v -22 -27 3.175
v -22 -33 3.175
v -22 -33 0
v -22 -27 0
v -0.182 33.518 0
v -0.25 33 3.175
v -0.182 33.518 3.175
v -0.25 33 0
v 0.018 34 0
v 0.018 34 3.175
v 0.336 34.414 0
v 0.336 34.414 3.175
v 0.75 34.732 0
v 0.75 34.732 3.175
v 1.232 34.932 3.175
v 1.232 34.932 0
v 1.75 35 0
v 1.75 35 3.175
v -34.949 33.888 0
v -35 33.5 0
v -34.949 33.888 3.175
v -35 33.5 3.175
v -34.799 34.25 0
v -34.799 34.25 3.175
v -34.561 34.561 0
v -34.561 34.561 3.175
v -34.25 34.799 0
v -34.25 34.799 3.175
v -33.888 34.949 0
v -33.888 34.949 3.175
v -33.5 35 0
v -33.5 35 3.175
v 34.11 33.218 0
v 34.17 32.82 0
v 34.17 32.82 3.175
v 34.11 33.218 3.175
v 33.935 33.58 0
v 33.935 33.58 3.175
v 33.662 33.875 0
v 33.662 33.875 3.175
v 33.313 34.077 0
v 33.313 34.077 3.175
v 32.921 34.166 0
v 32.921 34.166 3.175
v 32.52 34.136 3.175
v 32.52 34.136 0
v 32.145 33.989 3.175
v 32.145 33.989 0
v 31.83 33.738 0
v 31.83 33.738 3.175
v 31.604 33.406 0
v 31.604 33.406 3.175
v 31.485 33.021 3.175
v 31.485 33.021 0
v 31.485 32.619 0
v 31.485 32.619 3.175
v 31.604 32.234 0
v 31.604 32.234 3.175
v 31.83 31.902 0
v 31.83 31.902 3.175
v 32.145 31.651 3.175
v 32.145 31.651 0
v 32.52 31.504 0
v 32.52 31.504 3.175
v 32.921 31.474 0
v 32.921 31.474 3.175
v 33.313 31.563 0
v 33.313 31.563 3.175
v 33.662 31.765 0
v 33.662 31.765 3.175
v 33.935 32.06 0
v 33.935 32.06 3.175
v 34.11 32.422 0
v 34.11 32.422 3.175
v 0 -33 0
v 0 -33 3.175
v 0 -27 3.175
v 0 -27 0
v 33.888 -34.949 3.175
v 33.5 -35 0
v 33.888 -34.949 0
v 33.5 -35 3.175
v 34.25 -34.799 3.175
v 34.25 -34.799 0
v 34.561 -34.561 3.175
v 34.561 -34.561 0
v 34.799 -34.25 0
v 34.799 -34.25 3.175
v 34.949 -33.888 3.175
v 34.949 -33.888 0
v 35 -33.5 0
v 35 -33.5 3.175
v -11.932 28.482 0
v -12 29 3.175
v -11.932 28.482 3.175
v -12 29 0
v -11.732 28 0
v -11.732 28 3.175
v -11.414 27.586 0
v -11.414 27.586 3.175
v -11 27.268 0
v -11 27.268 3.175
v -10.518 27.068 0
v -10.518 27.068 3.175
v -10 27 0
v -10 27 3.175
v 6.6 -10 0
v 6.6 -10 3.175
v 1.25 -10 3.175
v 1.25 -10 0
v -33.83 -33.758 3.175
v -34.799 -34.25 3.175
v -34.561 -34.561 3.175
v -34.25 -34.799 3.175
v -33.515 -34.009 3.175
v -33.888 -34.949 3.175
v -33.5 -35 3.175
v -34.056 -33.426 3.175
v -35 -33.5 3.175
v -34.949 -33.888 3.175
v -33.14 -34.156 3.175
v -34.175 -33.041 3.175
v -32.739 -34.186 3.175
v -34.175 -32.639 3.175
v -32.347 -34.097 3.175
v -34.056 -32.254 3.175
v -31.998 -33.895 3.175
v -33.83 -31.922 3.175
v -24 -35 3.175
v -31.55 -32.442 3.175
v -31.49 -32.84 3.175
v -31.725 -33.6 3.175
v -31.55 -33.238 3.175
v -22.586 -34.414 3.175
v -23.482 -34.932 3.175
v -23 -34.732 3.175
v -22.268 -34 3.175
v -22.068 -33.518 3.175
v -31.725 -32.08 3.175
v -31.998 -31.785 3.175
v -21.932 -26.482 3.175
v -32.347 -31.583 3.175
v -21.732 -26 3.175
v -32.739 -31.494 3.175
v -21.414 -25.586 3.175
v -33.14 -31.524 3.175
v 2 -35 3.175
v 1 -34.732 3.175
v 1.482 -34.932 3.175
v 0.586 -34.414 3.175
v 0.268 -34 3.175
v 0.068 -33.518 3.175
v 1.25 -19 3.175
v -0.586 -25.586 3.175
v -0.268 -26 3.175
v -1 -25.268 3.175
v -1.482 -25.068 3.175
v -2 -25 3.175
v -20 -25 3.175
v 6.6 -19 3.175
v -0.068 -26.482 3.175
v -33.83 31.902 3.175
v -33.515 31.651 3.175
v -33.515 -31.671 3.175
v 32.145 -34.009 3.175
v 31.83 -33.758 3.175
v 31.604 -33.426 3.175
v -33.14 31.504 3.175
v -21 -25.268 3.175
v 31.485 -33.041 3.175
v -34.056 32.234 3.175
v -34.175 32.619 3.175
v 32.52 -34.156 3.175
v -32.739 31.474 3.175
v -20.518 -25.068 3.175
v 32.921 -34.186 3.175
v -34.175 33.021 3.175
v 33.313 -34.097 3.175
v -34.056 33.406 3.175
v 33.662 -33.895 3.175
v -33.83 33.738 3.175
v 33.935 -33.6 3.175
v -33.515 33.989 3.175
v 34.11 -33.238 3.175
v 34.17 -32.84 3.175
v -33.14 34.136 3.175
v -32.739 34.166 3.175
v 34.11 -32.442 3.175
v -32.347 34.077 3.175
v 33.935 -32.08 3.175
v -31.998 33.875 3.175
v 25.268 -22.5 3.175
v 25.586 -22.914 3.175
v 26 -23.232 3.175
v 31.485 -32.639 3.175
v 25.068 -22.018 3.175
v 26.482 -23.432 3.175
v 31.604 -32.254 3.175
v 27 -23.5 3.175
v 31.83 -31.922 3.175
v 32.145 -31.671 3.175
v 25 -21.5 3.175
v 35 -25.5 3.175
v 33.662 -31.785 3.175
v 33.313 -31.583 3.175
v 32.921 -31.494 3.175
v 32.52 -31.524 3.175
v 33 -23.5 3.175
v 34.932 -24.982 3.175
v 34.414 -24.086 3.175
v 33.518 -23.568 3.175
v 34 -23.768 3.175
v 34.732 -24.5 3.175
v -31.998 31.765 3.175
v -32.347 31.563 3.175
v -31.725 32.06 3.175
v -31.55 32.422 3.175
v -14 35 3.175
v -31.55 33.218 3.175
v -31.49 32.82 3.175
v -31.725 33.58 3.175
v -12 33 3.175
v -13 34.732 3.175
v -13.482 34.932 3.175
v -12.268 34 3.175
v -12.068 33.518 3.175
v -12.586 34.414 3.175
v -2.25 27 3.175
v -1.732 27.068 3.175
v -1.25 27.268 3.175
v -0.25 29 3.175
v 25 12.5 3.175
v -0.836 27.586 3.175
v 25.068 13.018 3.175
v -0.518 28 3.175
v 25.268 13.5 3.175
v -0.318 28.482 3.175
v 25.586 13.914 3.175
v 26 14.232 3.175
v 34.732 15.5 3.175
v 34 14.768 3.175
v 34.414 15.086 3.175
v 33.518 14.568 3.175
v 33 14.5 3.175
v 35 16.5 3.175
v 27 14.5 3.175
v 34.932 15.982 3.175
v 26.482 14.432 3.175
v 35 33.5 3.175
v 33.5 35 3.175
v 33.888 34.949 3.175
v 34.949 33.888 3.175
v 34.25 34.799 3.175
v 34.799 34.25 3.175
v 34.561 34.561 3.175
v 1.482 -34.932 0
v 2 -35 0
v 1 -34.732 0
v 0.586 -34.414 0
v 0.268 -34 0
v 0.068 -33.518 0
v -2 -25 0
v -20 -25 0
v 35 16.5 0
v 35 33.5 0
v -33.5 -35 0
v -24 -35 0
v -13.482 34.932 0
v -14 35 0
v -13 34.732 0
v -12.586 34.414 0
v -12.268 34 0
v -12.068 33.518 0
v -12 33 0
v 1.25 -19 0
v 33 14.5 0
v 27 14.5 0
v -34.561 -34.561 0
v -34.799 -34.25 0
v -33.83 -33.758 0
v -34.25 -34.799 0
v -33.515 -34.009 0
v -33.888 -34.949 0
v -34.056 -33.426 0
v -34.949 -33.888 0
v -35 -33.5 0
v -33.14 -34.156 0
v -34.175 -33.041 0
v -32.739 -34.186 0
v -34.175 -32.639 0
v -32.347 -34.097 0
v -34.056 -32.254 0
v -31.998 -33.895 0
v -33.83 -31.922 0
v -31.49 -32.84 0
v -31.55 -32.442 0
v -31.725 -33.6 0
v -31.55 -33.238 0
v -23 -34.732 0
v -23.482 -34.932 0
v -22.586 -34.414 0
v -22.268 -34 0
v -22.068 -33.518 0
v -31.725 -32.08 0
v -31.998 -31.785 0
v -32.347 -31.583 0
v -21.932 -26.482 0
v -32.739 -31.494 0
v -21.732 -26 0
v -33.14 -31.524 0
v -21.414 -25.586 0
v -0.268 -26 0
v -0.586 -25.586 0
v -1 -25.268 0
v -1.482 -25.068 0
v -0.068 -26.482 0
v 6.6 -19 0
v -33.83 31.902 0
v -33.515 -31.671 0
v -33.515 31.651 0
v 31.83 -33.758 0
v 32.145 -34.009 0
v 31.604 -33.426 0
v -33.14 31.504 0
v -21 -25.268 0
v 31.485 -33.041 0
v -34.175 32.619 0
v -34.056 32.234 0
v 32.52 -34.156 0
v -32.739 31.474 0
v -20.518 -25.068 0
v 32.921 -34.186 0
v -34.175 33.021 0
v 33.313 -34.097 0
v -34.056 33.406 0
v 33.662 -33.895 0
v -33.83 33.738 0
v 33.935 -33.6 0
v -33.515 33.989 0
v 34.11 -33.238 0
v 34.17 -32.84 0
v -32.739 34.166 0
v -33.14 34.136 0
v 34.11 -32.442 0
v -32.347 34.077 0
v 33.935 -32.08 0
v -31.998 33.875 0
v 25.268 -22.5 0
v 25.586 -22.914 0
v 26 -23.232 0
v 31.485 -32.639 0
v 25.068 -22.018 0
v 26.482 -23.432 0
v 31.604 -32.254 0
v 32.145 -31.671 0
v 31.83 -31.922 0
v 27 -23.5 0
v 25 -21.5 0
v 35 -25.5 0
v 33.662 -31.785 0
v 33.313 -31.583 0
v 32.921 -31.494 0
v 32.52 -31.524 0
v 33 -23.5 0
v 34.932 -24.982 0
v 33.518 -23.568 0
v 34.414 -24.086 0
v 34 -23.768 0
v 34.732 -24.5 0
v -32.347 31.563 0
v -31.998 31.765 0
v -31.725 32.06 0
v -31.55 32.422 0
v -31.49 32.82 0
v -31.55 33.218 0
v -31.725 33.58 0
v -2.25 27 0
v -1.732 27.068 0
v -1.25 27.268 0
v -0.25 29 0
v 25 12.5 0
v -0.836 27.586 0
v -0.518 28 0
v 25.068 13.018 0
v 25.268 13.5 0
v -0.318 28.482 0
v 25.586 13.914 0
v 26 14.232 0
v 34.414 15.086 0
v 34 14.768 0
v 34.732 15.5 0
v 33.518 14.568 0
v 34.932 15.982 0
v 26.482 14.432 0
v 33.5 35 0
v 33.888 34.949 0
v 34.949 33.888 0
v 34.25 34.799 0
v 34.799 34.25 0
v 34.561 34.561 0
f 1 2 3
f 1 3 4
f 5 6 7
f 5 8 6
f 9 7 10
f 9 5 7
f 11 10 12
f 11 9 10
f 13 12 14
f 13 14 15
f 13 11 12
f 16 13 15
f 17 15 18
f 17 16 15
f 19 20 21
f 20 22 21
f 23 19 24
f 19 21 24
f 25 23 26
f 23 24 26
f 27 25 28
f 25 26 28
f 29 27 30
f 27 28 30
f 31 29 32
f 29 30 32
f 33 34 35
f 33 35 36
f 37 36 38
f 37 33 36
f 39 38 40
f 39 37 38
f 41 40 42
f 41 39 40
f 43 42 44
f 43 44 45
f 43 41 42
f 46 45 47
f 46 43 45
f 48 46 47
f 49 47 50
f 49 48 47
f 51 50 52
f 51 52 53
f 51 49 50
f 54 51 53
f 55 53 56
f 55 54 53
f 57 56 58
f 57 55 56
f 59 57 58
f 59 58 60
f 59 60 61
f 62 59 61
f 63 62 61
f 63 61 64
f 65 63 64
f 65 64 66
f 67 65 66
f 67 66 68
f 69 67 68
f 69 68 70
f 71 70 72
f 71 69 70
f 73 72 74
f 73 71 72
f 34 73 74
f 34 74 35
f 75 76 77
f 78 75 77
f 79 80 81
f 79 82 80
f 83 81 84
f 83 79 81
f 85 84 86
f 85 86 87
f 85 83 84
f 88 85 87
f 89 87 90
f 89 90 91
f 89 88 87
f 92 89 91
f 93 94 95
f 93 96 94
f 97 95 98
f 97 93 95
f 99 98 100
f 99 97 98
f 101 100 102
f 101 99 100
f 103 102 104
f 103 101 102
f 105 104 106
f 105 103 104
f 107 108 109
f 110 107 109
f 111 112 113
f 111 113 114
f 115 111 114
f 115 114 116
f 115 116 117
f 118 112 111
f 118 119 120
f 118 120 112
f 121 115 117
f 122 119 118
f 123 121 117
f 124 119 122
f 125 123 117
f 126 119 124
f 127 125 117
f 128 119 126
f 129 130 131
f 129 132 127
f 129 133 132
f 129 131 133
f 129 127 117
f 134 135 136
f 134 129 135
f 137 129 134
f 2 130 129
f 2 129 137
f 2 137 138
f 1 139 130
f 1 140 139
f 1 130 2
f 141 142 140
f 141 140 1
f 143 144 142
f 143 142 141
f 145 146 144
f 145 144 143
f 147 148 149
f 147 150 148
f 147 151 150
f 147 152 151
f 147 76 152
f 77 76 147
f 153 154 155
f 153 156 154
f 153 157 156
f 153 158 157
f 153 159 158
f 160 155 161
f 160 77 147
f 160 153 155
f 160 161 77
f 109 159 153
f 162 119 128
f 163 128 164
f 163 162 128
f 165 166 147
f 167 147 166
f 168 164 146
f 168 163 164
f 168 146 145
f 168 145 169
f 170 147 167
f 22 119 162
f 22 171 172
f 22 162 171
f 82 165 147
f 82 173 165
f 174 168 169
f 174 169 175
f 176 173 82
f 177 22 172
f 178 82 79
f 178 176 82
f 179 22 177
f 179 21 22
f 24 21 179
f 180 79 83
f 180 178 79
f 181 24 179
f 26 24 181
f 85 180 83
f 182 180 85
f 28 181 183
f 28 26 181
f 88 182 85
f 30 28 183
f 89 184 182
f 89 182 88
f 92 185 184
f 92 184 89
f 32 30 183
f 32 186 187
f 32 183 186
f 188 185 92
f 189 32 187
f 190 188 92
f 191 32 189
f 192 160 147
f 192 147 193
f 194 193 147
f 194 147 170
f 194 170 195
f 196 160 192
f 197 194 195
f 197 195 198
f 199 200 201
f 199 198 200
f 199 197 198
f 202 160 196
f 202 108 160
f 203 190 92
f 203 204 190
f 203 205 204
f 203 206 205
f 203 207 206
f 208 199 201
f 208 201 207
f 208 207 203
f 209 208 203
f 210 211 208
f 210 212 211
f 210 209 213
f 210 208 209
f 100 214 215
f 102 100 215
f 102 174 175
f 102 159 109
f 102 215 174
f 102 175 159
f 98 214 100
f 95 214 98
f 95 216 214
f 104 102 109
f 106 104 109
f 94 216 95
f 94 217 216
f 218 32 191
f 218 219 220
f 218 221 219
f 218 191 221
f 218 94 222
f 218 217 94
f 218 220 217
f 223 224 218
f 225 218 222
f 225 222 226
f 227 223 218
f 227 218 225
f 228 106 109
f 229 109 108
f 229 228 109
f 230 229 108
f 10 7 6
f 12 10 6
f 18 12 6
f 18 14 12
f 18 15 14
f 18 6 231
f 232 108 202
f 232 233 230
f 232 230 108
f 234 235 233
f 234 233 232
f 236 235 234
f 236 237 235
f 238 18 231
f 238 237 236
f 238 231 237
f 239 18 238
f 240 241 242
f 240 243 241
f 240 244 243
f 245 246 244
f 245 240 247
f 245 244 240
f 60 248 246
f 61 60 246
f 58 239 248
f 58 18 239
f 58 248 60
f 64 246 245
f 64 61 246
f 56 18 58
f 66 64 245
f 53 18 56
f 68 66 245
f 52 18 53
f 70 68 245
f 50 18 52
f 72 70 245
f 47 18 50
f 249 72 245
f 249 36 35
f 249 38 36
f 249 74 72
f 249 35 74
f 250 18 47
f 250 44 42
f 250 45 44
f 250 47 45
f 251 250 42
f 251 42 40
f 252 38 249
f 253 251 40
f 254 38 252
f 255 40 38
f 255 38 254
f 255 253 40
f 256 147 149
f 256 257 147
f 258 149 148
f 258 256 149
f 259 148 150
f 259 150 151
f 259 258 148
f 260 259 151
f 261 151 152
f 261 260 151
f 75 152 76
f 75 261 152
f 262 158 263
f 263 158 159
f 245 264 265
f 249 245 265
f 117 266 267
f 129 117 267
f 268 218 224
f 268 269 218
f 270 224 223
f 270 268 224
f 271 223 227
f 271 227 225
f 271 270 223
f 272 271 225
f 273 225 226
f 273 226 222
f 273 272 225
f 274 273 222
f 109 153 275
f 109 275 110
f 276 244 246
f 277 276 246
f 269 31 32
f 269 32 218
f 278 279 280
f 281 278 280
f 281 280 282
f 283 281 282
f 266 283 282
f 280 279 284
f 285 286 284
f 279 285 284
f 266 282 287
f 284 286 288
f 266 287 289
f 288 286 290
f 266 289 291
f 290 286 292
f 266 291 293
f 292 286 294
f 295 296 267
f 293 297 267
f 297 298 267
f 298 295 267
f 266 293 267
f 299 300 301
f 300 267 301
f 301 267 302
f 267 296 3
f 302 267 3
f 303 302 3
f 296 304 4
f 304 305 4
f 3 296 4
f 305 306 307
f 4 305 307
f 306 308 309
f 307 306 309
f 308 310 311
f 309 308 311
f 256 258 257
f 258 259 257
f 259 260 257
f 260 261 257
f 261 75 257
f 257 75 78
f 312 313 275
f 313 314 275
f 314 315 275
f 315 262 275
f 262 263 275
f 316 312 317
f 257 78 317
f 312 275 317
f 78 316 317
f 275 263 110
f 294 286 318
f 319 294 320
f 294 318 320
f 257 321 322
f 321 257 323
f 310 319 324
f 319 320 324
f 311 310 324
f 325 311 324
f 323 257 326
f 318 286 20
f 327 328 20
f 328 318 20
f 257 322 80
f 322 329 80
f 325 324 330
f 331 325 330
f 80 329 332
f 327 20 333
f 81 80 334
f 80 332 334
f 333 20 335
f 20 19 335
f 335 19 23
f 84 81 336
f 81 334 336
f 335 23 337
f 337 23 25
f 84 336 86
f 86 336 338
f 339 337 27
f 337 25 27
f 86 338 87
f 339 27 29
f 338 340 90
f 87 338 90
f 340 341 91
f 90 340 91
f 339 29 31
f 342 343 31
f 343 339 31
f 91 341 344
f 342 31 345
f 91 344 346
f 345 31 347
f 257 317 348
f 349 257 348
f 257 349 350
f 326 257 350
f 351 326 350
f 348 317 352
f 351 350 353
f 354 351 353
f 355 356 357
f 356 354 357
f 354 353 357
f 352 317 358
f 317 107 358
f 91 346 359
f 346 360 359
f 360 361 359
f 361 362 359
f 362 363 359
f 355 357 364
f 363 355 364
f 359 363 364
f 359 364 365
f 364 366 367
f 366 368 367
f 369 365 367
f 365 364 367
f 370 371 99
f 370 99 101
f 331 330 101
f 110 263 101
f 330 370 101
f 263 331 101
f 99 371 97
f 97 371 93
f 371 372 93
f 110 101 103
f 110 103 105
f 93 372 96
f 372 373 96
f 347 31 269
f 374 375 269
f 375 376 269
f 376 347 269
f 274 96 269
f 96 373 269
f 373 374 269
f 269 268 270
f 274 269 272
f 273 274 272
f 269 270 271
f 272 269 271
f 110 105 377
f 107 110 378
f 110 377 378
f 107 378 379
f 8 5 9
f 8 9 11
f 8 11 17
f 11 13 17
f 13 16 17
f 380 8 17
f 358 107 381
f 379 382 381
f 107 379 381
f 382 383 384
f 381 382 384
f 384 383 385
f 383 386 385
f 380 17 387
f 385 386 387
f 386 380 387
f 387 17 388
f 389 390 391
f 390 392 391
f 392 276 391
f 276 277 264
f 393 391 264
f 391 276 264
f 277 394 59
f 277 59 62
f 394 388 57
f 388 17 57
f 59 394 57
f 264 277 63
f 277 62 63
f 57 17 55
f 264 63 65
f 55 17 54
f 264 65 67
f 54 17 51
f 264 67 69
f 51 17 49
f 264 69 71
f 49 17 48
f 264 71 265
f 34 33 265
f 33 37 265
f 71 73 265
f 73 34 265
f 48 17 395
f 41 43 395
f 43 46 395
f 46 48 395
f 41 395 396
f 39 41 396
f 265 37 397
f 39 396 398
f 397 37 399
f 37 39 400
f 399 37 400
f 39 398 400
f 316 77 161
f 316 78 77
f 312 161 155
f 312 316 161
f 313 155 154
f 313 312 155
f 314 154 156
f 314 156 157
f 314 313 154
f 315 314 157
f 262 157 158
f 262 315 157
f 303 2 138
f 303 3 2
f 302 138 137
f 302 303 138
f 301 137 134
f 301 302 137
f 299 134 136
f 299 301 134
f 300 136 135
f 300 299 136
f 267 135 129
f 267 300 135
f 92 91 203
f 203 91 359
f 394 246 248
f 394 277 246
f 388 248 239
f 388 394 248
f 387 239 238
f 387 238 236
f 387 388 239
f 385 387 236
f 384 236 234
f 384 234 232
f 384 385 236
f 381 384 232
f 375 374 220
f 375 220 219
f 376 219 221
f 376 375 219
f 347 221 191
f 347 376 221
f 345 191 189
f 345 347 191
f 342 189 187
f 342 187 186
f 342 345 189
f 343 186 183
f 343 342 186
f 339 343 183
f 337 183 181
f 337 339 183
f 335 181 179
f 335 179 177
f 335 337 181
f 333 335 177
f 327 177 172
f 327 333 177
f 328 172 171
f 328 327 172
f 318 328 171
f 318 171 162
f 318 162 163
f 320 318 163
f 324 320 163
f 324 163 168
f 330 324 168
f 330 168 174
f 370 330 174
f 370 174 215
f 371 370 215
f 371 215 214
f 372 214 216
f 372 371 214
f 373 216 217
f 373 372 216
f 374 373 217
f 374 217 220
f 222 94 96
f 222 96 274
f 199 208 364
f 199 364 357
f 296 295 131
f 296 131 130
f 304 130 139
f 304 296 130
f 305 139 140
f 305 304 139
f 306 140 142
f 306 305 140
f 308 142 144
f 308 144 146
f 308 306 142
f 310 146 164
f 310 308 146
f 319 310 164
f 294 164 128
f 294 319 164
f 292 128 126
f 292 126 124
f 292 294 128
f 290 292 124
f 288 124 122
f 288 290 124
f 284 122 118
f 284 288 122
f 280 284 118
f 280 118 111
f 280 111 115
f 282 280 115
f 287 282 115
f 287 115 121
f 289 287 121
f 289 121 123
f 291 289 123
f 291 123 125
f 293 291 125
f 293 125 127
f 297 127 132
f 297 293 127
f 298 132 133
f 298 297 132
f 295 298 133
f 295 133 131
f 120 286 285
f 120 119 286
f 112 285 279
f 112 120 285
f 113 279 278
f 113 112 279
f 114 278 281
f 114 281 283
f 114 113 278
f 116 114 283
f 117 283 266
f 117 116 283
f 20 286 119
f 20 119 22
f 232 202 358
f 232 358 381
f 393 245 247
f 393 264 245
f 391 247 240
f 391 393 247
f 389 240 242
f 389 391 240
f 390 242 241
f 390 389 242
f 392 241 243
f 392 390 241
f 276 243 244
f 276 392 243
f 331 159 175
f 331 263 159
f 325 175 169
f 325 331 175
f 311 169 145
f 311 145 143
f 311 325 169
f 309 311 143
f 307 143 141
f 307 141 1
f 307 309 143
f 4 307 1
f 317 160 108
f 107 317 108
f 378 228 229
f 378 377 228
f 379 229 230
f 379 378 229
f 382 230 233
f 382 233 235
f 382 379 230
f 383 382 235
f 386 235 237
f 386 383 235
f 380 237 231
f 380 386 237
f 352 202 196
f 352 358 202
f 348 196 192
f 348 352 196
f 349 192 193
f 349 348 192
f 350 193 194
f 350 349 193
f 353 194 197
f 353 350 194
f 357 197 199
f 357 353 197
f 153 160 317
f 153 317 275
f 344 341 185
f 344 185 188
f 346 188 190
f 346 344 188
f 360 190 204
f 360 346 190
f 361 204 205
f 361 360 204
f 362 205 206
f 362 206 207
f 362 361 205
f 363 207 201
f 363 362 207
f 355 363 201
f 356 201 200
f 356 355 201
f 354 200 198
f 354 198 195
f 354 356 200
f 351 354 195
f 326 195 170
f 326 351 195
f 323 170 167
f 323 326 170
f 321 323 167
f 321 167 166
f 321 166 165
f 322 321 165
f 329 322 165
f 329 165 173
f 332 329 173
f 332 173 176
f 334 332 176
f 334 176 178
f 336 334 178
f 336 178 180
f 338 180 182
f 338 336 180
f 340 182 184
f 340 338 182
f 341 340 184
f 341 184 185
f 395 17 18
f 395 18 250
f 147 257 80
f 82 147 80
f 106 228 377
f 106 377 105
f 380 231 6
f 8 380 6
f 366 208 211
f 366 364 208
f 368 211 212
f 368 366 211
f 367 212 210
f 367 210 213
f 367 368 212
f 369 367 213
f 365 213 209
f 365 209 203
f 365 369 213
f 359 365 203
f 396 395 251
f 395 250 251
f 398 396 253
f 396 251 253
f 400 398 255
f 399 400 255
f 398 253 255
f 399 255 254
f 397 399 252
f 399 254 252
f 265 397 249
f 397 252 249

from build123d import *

# Parameters (mm, degrees)
SKETCH1_W               = 70
SKETCH1_H               = 70
SKETCH1_R               = 1.35
BOSS_EXTRUDE1_DEPTH     = 3.175
FILLET1_R               = 1.5
CUT_EXTRUDE1_DEPTH      = 50.599199842
CUT_EXTRUDE1_DEPTH_BACK = 50.599199842
SKETCH2_W               = 10
SKETCH2_H               = 38
FILLET2_R               = 2
CUT_EXTRUDE2_DEPTH      = 50.599199842
CUT_EXTRUDE2_DEPTH_BACK = 50.599199842
SKETCH3_W               = 22
SKETCH3_H               = 10
SKETCH3_W_2             = 11.75
SKETCH3_H_2             = 8
SKETCH3_W_3             = 5.35
SKETCH3_H_3             = 9
FILLET3_R               = 2


with BuildPart() as part:
    # Sketch1 → Boss-Extrude1 (new body)
    with BuildSketch(Plane.XY):
        Rectangle(SKETCH1_W, SKETCH1_H)
        with Locations((-32.84, 32.82)):
            Circle(SKETCH1_R, mode=Mode.SUBTRACT)
        with Locations((-32.84, -32.84)):
            Circle(SKETCH1_R, mode=Mode.SUBTRACT)
        with Locations((32.82, -32.84)):
            Circle(SKETCH1_R, mode=Mode.SUBTRACT)
        with Locations((32.82, 32.82)):
            Circle(SKETCH1_R, mode=Mode.SUBTRACT)
    extrude(amount=BOSS_EXTRUDE1_DEPTH)

    # Fillet1
    fillet1_edges = [part.edges().sort_by_distance(p)[0] for p in [
        (35, -35, 1.5875),
        (-35, -35, 1.5875),
        (-35, 35, 1.5875),
        (35, 35, 1.5875),
    ]]
    fillet(fillet1_edges, radius=FILLET1_R)

    # Sketch2 → Cut-Extrude1 (cut, two sides: drawn at the far end of the back side and taken through both)
    with BuildSketch(Plane(origin=(0, 0, 0), x_dir=(-1, 0, 0), z_dir=(0, 0, -1)).offset(-CUT_EXTRUDE1_DEPTH_BACK)):
        with Locations((-30, -4.5)):
            Rectangle(SKETCH2_W, SKETCH2_H)
    extrude(amount=CUT_EXTRUDE1_DEPTH + CUT_EXTRUDE1_DEPTH_BACK, mode=Mode.SUBTRACT)

    # Fillet2
    fillet2_edges = [part.edges().sort_by_distance(p)[0] for p in [
        (35, -23.5, 1.5875),
        (25, 14.5, 1.5875),
        (35, 14.5, 1.5875),
        (25, -23.5, 1.5875),
    ]]
    fillet(fillet2_edges, radius=FILLET2_R)

    # Sketch3 → Cut-Extrude2 (cut, two sides: drawn at the far end of the back side and taken through both)
    with BuildSketch(Plane(origin=(0, 0, 0), x_dir=(-1, 0, 0), z_dir=(0, 0, -1)).offset(-CUT_EXTRUDE2_DEPTH_BACK)):
        with Locations((11, -30)):
            Rectangle(SKETCH3_W, SKETCH3_H)
        with Locations((6.125, 31)):
            Rectangle(SKETCH3_W_2, SKETCH3_H_2)
        with Locations((-3.925, -14.5)):
            Rectangle(SKETCH3_W_3, SKETCH3_H_3)
    extrude(amount=CUT_EXTRUDE2_DEPTH + CUT_EXTRUDE2_DEPTH_BACK, mode=Mode.SUBTRACT)

    # Fillet3
    fillet3_edges = [part.edges().sort_by_distance(p)[0] for p in [
        (-22, -35, 1.5875),
        (0, -25, 1.5875),
        (-22, -25, 1.5875),
        (0, -35, 1.5875),
        (-12, 27, 1.5875),
        (-0.25, 35, 1.5875),
        (-12, 35, 1.5875),
        (-0.25, 27, 1.5875),
    ]]
    fillet(fillet3_edges, radius=FILLET3_R)


solid = part.part
